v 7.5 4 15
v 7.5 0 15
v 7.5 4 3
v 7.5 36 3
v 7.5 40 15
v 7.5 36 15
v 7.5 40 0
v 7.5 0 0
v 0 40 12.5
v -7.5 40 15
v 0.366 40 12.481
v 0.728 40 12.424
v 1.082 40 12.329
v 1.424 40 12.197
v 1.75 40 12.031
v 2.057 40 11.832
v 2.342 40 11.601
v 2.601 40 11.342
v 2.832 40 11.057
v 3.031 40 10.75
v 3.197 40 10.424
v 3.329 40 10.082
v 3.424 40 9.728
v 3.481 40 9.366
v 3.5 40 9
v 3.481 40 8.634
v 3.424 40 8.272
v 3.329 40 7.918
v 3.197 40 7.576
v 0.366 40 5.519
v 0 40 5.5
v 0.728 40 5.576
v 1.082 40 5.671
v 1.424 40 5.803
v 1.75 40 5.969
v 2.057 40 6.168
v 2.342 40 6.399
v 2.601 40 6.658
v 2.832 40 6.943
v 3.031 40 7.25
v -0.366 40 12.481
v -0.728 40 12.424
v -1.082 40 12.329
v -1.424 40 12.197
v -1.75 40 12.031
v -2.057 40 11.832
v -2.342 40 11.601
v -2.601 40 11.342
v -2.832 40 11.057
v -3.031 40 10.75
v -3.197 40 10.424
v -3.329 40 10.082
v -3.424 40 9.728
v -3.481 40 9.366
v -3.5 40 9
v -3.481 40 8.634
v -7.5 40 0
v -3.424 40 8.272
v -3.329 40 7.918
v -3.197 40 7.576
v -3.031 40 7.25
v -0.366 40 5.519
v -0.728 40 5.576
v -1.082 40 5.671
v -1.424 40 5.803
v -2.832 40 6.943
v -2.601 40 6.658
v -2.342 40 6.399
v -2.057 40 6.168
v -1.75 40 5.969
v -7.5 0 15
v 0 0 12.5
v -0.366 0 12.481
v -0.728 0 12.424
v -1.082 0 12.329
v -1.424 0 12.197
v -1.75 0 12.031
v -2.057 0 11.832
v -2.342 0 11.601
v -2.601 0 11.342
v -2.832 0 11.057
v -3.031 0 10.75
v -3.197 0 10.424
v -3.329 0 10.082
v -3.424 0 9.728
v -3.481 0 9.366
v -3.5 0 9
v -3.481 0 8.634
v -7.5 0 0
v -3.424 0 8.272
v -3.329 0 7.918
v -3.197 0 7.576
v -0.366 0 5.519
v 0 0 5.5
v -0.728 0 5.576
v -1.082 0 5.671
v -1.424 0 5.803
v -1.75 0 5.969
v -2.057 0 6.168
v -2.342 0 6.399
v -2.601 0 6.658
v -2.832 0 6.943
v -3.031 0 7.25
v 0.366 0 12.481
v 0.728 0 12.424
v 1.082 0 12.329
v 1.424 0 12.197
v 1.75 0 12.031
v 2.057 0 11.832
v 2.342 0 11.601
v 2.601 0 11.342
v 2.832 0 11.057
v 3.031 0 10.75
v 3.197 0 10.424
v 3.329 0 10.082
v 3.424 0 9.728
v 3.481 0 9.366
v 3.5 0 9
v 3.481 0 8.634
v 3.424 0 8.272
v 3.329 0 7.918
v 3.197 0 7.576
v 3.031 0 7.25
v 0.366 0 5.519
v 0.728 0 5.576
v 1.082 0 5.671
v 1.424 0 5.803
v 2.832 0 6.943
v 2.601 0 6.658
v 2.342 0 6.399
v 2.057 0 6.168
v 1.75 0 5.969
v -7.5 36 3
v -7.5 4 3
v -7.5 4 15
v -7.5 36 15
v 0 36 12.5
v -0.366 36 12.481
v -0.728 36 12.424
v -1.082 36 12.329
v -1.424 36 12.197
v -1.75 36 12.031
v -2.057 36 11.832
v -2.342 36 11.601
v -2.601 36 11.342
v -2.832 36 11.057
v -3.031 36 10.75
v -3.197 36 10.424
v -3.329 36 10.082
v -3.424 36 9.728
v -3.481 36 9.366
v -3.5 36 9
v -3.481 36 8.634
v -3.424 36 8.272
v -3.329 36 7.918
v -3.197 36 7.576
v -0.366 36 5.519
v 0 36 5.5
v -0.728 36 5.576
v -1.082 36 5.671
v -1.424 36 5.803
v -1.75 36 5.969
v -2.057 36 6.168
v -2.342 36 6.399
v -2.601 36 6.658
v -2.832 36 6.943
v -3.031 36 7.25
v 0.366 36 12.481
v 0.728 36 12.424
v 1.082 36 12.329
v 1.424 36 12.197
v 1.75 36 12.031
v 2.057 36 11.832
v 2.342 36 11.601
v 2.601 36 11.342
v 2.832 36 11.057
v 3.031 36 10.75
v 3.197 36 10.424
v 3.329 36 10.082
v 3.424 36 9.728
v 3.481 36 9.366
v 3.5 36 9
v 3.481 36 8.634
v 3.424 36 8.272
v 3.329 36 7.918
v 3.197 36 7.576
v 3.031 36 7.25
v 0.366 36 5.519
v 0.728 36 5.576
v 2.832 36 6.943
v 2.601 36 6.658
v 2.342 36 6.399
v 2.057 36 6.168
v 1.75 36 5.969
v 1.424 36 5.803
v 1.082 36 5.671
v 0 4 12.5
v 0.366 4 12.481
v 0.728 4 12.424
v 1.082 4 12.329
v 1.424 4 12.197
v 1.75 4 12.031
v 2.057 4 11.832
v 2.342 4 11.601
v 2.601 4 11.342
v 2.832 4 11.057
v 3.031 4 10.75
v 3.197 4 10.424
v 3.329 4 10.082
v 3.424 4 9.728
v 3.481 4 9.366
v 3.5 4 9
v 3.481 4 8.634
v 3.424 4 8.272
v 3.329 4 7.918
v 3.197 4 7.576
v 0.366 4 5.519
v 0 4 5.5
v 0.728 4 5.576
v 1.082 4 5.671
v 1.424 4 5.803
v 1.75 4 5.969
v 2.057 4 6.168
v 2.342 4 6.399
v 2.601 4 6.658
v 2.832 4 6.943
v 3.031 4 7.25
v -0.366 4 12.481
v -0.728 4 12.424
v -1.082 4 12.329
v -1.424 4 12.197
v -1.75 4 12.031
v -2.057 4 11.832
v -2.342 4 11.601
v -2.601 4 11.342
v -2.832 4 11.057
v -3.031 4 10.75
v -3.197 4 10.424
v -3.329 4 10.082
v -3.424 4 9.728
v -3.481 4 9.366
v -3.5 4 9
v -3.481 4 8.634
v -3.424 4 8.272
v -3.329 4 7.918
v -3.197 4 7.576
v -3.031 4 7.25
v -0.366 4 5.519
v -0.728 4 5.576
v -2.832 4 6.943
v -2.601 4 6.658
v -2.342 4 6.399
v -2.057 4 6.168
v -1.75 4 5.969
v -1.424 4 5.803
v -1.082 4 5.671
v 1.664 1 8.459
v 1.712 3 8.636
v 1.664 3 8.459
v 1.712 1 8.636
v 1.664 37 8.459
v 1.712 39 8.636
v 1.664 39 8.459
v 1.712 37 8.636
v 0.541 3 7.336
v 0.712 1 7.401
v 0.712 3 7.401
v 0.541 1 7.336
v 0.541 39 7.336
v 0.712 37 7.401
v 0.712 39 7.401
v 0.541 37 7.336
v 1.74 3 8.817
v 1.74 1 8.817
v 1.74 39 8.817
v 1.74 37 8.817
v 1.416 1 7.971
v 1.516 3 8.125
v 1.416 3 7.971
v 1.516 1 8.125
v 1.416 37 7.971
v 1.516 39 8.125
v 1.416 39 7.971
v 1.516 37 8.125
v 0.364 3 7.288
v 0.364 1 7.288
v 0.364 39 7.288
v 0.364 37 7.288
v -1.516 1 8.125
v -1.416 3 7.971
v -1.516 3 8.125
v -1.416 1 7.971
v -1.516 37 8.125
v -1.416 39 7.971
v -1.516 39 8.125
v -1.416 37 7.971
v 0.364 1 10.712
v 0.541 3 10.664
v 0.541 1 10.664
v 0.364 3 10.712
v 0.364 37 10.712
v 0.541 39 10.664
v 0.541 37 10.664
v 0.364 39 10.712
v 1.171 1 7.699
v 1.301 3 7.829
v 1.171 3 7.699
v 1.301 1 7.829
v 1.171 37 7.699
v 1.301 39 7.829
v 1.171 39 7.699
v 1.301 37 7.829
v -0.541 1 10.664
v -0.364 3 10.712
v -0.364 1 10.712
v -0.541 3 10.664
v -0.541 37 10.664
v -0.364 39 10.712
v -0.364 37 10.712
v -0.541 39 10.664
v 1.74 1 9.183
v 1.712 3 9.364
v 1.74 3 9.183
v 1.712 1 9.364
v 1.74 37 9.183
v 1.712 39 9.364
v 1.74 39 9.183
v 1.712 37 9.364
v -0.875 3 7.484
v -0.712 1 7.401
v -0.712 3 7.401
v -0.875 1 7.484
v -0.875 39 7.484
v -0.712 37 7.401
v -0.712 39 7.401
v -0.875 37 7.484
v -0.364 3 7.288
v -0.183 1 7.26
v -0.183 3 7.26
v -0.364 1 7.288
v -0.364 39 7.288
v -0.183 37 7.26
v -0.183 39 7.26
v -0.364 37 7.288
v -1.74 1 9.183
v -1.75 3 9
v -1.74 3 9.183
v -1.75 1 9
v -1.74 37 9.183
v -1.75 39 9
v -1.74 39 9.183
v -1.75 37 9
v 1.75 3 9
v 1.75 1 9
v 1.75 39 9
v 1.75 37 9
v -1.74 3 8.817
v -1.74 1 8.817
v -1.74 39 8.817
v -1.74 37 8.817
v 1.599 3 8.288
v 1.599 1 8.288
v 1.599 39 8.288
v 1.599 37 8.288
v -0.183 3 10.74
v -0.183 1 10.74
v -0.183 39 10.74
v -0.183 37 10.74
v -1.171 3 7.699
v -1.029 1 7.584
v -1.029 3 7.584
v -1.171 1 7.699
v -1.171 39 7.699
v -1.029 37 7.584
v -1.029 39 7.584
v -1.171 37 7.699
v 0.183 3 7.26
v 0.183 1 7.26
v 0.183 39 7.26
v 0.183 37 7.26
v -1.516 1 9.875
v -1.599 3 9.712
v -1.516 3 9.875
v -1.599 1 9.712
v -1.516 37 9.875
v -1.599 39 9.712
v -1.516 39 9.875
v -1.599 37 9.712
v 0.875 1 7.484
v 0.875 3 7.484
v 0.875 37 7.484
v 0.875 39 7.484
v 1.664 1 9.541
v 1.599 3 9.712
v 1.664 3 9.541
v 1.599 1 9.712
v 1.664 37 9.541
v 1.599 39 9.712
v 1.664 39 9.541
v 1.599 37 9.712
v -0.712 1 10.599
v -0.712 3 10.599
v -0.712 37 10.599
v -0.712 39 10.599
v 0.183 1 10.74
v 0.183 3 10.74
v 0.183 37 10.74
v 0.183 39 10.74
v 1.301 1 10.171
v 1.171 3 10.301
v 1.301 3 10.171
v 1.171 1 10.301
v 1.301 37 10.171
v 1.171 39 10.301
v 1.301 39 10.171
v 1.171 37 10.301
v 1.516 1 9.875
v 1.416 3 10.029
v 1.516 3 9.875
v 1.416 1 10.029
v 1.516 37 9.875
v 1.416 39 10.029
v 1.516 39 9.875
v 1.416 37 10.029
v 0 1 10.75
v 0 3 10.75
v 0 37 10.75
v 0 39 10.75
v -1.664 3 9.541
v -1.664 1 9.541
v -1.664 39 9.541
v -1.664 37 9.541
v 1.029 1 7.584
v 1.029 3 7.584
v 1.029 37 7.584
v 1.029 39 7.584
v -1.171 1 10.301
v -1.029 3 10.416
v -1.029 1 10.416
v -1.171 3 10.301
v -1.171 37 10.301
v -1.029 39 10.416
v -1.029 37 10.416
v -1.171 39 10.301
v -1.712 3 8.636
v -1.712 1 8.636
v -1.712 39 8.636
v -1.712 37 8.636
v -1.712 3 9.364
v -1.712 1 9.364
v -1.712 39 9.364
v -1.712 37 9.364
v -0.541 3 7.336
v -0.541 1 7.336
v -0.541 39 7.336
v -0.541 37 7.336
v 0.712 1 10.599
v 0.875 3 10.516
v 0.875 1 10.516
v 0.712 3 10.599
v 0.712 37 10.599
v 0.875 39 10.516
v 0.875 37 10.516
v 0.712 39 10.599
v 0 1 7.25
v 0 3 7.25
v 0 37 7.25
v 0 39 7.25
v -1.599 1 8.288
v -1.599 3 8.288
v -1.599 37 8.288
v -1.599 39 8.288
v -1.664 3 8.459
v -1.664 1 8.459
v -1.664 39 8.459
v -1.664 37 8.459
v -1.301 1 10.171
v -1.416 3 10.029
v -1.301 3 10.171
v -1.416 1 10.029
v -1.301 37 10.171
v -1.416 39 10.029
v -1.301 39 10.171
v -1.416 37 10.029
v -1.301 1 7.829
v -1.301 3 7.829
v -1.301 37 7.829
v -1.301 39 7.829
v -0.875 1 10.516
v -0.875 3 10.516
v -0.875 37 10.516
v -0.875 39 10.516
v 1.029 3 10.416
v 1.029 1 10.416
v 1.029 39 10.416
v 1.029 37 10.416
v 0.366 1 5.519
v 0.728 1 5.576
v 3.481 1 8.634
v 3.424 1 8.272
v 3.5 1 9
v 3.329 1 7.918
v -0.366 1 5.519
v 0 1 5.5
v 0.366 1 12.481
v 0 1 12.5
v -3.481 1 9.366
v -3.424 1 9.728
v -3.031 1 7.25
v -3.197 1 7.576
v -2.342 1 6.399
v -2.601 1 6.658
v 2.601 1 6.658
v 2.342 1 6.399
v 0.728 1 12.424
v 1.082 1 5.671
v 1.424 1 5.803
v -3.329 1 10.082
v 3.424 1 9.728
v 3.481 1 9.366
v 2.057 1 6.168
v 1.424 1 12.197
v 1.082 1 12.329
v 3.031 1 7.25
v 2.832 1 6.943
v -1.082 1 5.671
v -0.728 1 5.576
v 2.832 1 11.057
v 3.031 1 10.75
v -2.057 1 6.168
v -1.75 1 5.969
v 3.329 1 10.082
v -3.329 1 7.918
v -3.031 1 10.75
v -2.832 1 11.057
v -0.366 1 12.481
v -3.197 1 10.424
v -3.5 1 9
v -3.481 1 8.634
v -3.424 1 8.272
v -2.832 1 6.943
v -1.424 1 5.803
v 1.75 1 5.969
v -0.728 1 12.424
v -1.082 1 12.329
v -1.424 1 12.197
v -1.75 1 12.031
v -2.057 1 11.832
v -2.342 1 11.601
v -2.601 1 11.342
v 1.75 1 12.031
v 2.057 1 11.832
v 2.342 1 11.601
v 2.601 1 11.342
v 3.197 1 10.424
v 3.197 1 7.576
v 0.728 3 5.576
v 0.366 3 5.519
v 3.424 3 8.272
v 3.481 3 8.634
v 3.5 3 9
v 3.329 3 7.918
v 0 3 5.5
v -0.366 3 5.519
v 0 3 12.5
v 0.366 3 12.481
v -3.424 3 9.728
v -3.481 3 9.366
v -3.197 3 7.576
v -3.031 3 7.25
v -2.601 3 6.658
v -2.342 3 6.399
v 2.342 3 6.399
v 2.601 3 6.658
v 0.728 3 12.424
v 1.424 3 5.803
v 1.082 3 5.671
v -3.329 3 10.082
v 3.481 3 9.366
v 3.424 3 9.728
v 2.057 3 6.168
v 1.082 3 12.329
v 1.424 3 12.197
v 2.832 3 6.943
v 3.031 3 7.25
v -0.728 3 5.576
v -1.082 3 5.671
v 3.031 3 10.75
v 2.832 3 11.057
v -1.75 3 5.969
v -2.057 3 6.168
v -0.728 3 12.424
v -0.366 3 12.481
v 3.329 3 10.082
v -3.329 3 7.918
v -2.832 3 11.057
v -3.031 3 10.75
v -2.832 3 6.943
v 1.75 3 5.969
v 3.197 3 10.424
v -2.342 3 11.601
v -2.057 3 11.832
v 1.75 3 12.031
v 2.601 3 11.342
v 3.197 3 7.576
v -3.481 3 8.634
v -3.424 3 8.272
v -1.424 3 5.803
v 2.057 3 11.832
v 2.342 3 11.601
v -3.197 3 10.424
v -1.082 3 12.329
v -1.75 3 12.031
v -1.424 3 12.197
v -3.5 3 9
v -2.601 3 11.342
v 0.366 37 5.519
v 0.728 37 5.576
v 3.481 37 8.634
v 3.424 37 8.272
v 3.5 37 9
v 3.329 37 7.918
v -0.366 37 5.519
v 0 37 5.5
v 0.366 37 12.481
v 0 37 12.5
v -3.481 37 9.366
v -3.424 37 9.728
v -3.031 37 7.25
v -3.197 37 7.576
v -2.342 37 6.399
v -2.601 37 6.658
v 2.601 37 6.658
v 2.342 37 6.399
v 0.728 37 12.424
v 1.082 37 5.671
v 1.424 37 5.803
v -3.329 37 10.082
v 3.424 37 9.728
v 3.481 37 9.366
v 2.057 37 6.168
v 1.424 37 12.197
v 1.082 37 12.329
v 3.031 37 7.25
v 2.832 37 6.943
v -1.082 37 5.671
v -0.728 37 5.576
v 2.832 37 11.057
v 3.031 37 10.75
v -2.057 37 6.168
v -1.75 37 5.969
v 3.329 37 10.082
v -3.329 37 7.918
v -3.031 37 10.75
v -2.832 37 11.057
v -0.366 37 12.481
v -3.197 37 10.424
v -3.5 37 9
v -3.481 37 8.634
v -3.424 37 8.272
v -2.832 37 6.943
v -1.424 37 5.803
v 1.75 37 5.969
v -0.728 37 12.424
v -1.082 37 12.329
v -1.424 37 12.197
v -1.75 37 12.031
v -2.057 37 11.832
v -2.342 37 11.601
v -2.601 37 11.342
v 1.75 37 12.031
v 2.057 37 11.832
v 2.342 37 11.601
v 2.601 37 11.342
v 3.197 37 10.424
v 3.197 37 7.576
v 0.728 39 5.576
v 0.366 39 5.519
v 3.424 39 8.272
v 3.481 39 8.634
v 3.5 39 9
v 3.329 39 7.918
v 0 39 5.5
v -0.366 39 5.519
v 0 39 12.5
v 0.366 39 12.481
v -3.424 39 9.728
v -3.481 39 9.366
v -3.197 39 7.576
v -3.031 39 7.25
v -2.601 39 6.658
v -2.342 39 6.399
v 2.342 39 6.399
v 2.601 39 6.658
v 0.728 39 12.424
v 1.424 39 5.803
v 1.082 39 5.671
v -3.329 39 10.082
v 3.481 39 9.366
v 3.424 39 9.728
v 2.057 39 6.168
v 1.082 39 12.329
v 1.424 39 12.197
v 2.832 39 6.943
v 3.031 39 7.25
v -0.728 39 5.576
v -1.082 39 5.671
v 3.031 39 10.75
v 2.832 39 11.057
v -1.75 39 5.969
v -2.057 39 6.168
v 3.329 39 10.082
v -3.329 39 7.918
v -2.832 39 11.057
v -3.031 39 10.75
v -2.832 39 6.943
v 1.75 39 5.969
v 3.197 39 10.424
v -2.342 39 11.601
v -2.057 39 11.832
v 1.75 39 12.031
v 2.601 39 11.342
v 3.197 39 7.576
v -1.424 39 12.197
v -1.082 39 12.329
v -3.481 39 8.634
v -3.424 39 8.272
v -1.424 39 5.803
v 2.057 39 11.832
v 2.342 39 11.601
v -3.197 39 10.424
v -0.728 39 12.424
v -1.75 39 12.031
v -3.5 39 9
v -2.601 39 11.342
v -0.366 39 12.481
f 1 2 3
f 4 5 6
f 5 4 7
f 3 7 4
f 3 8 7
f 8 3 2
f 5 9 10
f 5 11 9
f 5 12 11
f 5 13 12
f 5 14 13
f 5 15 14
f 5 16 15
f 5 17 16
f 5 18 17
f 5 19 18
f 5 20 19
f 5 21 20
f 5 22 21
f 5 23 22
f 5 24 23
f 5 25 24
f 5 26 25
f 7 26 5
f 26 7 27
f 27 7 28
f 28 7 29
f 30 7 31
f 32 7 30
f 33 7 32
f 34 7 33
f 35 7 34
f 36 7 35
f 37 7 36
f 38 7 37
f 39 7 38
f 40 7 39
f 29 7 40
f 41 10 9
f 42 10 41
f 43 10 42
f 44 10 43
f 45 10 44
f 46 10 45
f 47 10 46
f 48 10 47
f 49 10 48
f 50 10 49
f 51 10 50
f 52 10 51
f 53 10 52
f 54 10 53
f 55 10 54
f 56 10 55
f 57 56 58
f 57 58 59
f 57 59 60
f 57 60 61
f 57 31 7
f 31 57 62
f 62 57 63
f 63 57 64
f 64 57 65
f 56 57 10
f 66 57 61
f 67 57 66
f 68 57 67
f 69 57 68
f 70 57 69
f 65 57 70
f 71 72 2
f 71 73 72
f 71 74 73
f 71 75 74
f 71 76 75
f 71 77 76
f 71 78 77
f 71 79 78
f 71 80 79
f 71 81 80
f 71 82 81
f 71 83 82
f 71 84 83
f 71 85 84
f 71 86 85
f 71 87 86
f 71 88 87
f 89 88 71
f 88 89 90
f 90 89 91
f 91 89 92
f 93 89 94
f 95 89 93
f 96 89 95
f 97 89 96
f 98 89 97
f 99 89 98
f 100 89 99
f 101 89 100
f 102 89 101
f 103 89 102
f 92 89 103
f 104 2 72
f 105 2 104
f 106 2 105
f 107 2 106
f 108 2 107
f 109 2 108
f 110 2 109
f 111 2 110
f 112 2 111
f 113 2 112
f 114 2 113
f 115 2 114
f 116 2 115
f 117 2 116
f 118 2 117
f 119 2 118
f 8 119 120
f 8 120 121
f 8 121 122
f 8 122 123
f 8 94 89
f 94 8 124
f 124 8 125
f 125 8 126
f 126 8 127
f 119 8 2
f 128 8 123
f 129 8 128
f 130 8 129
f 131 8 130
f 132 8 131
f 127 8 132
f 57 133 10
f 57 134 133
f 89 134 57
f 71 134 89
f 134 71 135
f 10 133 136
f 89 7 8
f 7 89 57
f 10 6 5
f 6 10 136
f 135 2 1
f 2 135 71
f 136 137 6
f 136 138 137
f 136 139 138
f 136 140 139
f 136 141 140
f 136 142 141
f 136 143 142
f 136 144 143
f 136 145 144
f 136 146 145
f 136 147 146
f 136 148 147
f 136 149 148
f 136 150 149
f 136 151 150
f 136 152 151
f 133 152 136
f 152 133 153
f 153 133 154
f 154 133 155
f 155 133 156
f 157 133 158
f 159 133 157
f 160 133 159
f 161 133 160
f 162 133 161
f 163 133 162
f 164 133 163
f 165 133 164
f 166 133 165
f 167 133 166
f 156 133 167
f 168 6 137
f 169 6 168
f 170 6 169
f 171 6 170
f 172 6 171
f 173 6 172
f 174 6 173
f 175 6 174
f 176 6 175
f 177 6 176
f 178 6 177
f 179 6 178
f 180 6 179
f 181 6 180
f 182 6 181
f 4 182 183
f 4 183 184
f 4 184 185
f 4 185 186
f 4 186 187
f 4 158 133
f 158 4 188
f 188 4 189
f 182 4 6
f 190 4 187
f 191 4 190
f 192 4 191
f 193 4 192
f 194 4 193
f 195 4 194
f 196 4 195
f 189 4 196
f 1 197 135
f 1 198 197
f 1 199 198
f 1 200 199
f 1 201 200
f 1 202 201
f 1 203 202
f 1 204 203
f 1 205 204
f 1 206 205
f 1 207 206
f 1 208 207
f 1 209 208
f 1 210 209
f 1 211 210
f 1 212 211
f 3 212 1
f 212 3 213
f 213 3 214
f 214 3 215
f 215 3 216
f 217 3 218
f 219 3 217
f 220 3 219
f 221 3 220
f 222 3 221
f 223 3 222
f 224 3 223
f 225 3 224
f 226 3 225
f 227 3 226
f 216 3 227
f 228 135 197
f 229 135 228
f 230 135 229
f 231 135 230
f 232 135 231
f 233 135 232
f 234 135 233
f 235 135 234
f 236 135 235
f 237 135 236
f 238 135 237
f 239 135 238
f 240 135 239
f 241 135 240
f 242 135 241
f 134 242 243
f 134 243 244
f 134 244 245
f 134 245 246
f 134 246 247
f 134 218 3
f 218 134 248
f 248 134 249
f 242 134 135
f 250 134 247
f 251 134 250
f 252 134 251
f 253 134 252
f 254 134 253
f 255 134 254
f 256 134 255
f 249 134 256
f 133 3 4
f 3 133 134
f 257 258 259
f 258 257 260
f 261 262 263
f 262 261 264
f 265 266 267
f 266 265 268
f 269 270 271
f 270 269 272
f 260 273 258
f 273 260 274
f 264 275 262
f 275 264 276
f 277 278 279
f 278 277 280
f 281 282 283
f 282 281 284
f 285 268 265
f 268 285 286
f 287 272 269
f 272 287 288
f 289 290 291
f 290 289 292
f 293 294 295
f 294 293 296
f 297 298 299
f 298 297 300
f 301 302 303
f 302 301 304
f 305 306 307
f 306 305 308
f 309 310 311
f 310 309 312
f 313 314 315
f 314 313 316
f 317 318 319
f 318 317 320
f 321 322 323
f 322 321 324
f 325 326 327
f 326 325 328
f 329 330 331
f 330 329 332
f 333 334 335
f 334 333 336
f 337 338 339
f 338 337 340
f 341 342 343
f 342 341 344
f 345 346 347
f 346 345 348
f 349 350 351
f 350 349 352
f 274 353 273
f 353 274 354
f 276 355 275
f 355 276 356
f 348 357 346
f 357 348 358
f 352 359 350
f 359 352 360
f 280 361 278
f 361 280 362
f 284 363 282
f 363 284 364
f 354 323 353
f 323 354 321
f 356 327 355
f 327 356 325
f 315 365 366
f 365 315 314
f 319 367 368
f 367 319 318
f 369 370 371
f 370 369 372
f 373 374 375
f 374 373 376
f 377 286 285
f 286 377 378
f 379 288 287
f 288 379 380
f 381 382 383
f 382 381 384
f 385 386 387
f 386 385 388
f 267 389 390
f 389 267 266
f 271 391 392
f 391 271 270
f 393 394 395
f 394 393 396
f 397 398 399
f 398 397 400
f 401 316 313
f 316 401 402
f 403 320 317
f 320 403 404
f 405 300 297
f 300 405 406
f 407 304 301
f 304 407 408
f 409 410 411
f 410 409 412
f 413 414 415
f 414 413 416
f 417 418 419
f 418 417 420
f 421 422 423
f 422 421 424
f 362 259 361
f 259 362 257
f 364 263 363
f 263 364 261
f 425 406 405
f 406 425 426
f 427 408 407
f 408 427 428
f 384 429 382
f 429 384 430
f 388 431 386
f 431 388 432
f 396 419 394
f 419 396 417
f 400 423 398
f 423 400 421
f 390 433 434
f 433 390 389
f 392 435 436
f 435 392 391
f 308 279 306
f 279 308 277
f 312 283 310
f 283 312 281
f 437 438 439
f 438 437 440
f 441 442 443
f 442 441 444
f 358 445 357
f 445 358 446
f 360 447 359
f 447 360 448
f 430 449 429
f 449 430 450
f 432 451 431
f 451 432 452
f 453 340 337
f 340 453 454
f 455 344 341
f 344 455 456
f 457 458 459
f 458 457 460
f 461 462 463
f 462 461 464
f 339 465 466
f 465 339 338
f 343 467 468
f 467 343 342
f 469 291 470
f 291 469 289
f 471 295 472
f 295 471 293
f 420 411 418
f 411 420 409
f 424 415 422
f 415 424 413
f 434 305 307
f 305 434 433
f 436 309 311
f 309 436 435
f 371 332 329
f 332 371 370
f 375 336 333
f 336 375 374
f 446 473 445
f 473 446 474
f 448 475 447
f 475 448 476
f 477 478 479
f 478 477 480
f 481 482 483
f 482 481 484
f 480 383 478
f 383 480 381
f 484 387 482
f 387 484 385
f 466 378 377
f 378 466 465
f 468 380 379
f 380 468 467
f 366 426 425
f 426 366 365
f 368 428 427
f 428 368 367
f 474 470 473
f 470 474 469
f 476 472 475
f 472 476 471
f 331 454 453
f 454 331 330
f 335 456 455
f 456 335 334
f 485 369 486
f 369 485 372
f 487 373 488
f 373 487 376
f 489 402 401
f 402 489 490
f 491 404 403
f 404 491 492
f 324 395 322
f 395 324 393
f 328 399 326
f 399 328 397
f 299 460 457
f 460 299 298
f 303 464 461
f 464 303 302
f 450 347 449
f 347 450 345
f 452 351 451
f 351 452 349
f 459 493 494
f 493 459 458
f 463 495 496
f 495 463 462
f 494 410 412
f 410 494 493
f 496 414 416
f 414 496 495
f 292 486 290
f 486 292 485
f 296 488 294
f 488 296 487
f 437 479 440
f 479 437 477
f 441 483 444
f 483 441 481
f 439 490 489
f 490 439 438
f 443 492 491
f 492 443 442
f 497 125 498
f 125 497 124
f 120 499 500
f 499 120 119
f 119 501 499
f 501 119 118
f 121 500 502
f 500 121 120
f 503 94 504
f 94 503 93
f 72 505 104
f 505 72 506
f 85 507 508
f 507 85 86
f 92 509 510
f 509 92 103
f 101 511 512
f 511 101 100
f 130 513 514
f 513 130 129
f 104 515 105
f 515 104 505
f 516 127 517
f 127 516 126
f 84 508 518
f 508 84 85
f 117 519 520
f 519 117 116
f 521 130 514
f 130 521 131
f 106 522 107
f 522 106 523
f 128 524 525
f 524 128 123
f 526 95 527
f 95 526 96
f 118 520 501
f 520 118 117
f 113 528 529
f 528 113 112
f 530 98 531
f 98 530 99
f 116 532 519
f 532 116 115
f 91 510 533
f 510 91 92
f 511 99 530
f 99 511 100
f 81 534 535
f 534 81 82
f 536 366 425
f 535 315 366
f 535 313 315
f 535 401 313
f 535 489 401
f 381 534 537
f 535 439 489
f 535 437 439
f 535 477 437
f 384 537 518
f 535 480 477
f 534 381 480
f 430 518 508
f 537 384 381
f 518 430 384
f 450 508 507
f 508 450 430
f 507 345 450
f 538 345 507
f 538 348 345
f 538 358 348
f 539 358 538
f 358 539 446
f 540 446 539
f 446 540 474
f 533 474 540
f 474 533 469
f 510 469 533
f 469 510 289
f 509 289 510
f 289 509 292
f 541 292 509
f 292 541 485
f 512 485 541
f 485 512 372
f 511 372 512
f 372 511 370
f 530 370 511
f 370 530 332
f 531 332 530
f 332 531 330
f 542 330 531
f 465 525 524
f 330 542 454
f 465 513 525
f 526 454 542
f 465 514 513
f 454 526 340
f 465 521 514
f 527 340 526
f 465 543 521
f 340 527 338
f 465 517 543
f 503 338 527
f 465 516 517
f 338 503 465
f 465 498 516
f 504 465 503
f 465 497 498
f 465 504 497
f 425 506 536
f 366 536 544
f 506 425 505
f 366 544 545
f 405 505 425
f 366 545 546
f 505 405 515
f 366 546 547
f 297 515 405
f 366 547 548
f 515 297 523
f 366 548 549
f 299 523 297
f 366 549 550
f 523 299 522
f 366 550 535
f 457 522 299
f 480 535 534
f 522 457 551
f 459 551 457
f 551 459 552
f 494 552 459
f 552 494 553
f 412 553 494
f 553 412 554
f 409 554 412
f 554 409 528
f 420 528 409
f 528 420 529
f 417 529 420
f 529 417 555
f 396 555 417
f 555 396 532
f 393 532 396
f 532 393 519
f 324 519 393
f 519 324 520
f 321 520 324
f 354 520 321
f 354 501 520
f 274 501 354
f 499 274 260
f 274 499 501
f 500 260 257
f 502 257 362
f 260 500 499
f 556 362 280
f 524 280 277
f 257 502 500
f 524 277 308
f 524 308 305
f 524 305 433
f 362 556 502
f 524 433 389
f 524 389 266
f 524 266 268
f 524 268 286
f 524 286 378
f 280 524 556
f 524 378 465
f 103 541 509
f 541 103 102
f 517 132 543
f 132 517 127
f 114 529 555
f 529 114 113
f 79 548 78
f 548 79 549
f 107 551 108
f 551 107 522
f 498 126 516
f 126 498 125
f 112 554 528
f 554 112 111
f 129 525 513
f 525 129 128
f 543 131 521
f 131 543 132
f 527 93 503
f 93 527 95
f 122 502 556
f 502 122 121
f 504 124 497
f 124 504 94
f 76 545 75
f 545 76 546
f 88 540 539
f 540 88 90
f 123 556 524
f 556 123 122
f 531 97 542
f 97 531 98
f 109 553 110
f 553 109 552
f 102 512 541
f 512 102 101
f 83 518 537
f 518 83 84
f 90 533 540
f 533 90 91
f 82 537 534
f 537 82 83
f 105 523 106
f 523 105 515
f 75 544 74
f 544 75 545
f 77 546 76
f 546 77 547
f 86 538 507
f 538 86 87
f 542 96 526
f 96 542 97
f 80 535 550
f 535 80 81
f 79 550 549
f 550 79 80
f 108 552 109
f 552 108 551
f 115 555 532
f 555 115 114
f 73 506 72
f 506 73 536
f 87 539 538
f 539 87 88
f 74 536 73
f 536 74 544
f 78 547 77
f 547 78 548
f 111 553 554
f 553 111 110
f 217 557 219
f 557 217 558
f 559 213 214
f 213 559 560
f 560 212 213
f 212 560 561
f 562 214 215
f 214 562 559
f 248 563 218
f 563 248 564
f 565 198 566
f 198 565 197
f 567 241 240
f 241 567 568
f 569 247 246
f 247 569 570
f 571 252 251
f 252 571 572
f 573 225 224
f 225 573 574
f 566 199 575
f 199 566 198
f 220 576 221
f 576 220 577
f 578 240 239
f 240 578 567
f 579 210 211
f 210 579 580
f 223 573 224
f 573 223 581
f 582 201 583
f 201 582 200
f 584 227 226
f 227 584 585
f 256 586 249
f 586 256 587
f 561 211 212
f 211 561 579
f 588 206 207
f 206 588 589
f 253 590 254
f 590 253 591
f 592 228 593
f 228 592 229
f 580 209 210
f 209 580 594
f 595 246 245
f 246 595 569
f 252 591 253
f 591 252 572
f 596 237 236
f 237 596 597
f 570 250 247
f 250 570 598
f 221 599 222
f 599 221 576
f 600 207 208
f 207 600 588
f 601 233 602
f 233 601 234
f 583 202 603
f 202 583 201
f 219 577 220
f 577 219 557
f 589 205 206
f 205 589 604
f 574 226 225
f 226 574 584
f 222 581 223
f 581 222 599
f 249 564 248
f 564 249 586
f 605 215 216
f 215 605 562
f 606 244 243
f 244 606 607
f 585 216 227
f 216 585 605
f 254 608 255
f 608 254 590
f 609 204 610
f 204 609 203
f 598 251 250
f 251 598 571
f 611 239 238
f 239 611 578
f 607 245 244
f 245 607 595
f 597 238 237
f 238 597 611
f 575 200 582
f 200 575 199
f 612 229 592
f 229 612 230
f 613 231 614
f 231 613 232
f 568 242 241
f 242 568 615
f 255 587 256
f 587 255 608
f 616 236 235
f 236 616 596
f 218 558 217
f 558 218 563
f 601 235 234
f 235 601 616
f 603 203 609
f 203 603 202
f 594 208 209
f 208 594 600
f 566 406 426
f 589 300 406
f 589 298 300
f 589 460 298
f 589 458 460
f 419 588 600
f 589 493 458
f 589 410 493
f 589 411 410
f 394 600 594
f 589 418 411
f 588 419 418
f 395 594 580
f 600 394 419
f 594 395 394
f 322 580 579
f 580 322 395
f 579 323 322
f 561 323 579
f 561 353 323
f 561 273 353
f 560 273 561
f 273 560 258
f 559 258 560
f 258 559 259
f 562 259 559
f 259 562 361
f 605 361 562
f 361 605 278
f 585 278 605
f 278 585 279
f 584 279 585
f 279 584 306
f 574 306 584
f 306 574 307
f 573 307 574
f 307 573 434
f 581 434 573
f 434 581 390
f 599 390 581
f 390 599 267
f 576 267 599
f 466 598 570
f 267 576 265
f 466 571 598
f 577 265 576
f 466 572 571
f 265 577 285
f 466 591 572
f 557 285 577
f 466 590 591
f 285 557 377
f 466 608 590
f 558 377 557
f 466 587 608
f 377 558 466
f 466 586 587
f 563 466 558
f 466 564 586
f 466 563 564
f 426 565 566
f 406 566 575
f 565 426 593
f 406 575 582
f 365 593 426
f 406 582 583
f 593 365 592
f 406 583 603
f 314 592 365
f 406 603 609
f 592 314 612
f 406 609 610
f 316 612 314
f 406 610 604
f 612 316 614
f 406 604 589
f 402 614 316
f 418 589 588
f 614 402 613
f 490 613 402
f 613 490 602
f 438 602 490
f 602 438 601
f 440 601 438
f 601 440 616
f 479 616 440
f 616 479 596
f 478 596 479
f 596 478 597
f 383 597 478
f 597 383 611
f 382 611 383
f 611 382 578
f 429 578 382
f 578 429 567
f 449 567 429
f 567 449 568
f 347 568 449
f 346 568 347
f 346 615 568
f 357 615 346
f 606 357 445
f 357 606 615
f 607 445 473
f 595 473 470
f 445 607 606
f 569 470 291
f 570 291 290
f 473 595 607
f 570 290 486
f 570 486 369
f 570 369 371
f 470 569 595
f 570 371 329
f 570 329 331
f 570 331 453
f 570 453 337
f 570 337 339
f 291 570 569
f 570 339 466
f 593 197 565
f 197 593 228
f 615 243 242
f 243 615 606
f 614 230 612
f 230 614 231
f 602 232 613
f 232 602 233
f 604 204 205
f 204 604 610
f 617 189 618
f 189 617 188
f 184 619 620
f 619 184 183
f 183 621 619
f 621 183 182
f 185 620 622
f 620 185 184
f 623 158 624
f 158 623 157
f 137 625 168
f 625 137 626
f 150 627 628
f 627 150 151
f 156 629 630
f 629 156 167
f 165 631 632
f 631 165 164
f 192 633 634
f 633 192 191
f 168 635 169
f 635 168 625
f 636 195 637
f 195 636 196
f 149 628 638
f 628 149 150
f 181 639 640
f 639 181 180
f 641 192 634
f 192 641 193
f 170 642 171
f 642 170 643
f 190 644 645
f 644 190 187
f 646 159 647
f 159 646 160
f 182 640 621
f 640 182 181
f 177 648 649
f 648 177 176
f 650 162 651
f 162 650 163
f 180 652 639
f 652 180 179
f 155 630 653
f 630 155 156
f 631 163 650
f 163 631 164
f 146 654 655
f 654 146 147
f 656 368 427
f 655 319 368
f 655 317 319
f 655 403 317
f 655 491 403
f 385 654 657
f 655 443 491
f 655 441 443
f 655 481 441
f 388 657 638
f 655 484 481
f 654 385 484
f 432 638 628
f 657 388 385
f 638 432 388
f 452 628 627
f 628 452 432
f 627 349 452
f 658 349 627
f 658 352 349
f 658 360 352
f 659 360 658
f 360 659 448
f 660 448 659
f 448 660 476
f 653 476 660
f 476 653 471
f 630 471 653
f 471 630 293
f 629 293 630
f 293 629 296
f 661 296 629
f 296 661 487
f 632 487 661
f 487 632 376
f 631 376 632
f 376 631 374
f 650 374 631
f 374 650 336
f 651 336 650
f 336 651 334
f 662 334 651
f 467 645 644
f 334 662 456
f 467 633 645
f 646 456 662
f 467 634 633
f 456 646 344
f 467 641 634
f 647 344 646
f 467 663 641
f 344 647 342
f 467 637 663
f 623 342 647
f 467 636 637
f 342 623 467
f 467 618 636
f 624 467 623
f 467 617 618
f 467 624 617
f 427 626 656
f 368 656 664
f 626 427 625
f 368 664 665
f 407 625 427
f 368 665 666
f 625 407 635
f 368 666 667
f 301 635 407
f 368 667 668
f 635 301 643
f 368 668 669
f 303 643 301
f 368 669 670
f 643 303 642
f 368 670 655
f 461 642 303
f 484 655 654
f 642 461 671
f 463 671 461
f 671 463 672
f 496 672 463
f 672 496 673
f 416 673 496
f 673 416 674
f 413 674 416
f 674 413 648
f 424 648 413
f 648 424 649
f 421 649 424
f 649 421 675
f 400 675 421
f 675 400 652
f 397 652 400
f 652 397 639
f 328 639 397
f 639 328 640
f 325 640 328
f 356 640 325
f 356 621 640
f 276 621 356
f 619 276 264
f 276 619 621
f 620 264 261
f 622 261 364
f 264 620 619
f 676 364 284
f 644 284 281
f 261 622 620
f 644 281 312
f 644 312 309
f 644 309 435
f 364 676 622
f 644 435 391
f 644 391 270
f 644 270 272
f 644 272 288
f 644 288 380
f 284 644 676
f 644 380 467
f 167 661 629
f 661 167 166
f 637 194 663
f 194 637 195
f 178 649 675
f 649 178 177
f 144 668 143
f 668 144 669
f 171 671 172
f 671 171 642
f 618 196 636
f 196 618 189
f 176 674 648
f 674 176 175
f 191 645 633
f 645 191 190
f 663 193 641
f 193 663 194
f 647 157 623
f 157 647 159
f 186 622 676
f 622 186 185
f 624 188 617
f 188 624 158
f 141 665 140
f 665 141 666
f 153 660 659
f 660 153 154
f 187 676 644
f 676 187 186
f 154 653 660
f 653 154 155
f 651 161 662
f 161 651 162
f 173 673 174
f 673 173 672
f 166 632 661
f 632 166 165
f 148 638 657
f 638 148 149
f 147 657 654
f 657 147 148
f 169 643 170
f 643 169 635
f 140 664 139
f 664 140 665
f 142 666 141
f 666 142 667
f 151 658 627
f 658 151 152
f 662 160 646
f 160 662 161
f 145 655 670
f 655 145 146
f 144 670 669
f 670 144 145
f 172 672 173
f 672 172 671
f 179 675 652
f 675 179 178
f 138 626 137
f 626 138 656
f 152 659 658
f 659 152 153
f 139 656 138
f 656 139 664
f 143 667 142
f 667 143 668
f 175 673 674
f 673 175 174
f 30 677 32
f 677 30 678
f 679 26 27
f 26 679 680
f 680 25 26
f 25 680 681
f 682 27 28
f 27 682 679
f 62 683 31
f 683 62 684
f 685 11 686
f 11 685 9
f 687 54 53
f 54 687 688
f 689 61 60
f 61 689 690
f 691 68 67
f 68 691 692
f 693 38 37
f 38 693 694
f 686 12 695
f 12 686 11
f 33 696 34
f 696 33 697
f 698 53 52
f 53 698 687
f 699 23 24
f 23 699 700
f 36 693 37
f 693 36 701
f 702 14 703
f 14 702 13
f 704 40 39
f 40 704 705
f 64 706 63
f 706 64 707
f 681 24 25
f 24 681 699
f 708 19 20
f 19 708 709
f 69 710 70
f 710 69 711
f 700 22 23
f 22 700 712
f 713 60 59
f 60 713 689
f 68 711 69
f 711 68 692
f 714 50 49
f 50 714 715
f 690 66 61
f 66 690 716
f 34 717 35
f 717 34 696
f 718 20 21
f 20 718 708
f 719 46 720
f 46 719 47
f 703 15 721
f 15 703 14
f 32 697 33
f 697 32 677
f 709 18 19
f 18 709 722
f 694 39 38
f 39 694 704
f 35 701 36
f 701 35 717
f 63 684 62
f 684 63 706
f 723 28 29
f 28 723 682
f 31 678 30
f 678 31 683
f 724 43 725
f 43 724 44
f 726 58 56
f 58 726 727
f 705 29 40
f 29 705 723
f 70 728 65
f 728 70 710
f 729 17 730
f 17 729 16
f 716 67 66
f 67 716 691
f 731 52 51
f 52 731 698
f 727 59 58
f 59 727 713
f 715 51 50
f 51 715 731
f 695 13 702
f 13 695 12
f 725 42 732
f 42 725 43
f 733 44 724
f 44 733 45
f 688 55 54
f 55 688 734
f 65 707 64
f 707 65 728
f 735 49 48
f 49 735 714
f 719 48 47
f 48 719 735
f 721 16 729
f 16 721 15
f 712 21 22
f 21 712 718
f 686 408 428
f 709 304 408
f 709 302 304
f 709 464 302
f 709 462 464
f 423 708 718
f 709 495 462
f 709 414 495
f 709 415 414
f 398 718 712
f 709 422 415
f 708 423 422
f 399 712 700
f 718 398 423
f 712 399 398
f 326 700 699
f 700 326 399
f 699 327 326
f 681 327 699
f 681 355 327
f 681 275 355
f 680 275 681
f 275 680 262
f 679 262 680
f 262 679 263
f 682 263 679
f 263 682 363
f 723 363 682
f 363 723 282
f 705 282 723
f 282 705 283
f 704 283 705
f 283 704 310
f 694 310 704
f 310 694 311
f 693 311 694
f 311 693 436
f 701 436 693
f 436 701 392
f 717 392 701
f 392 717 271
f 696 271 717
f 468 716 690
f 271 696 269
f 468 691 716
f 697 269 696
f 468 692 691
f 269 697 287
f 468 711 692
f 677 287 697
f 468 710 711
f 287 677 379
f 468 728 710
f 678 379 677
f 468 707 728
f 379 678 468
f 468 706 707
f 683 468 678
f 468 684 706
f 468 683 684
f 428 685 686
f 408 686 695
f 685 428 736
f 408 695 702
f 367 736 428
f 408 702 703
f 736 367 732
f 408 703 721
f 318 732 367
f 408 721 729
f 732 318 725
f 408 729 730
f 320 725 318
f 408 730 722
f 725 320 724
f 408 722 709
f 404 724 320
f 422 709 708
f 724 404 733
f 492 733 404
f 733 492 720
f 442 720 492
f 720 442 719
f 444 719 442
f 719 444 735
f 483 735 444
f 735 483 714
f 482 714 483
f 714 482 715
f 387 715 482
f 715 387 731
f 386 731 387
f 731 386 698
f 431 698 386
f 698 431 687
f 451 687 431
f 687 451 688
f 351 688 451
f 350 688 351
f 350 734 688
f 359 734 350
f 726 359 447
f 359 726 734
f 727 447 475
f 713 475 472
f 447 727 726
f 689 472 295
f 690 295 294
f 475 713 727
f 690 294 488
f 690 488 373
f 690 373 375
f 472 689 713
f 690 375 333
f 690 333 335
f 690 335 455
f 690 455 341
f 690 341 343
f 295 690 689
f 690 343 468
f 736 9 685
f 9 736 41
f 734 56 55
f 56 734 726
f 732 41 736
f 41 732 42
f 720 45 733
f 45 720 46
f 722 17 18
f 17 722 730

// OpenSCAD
// variables all in mm
screwDiam = 3;
spacerHeight = 40;

vShell = 3; // vertical shell
hShell = 4; // horizontal shell

insetDiam = 7; // diameter of screw head
inset = 1;


// calculated vars
outerCube = [screwDiam + vShell*2 + vShell*2, 	
			screwDiam + vShell*2 + vShell*2, 		
			spacerHeight];					
				
innerCube = [outerCube.x, 			
			outerCube.y, 			
			spacerHeight - hShell*2];	

// smooth cylinder		
$fn=60;	

// start code
translate([0, 0, (outerCube.y+vShell)/2])
{
	rotate([270, 00, 0])
	{
		difference()
		{

			translate([-outerCube.x, -outerCube.y + vShell, 0]/2)
			{
				cube(outerCube);
			}

			translate([-innerCube.x/2, -innerCube.y/2 - vShell/2, hShell])
			{
				cube(innerCube);
			}

			cylinder(d = screwDiam + 0.5, h = spacerHeight);
			
			//insets
			cylinder(d = insetDiam, h = inset);
			
			translate([0, 0, hShell  - inset])
			{
				cylinder(d = insetDiam, h = inset);
			}
			
			translate([0, 0, outerCube.z - hShell])
			{
				cylinder(d = insetDiam, h = inset);
			}
			
			translate([0, 0, outerCube.z - inset])
			{
				cylinder(d = insetDiam, h = inset);
			}			

		}
	}
}
